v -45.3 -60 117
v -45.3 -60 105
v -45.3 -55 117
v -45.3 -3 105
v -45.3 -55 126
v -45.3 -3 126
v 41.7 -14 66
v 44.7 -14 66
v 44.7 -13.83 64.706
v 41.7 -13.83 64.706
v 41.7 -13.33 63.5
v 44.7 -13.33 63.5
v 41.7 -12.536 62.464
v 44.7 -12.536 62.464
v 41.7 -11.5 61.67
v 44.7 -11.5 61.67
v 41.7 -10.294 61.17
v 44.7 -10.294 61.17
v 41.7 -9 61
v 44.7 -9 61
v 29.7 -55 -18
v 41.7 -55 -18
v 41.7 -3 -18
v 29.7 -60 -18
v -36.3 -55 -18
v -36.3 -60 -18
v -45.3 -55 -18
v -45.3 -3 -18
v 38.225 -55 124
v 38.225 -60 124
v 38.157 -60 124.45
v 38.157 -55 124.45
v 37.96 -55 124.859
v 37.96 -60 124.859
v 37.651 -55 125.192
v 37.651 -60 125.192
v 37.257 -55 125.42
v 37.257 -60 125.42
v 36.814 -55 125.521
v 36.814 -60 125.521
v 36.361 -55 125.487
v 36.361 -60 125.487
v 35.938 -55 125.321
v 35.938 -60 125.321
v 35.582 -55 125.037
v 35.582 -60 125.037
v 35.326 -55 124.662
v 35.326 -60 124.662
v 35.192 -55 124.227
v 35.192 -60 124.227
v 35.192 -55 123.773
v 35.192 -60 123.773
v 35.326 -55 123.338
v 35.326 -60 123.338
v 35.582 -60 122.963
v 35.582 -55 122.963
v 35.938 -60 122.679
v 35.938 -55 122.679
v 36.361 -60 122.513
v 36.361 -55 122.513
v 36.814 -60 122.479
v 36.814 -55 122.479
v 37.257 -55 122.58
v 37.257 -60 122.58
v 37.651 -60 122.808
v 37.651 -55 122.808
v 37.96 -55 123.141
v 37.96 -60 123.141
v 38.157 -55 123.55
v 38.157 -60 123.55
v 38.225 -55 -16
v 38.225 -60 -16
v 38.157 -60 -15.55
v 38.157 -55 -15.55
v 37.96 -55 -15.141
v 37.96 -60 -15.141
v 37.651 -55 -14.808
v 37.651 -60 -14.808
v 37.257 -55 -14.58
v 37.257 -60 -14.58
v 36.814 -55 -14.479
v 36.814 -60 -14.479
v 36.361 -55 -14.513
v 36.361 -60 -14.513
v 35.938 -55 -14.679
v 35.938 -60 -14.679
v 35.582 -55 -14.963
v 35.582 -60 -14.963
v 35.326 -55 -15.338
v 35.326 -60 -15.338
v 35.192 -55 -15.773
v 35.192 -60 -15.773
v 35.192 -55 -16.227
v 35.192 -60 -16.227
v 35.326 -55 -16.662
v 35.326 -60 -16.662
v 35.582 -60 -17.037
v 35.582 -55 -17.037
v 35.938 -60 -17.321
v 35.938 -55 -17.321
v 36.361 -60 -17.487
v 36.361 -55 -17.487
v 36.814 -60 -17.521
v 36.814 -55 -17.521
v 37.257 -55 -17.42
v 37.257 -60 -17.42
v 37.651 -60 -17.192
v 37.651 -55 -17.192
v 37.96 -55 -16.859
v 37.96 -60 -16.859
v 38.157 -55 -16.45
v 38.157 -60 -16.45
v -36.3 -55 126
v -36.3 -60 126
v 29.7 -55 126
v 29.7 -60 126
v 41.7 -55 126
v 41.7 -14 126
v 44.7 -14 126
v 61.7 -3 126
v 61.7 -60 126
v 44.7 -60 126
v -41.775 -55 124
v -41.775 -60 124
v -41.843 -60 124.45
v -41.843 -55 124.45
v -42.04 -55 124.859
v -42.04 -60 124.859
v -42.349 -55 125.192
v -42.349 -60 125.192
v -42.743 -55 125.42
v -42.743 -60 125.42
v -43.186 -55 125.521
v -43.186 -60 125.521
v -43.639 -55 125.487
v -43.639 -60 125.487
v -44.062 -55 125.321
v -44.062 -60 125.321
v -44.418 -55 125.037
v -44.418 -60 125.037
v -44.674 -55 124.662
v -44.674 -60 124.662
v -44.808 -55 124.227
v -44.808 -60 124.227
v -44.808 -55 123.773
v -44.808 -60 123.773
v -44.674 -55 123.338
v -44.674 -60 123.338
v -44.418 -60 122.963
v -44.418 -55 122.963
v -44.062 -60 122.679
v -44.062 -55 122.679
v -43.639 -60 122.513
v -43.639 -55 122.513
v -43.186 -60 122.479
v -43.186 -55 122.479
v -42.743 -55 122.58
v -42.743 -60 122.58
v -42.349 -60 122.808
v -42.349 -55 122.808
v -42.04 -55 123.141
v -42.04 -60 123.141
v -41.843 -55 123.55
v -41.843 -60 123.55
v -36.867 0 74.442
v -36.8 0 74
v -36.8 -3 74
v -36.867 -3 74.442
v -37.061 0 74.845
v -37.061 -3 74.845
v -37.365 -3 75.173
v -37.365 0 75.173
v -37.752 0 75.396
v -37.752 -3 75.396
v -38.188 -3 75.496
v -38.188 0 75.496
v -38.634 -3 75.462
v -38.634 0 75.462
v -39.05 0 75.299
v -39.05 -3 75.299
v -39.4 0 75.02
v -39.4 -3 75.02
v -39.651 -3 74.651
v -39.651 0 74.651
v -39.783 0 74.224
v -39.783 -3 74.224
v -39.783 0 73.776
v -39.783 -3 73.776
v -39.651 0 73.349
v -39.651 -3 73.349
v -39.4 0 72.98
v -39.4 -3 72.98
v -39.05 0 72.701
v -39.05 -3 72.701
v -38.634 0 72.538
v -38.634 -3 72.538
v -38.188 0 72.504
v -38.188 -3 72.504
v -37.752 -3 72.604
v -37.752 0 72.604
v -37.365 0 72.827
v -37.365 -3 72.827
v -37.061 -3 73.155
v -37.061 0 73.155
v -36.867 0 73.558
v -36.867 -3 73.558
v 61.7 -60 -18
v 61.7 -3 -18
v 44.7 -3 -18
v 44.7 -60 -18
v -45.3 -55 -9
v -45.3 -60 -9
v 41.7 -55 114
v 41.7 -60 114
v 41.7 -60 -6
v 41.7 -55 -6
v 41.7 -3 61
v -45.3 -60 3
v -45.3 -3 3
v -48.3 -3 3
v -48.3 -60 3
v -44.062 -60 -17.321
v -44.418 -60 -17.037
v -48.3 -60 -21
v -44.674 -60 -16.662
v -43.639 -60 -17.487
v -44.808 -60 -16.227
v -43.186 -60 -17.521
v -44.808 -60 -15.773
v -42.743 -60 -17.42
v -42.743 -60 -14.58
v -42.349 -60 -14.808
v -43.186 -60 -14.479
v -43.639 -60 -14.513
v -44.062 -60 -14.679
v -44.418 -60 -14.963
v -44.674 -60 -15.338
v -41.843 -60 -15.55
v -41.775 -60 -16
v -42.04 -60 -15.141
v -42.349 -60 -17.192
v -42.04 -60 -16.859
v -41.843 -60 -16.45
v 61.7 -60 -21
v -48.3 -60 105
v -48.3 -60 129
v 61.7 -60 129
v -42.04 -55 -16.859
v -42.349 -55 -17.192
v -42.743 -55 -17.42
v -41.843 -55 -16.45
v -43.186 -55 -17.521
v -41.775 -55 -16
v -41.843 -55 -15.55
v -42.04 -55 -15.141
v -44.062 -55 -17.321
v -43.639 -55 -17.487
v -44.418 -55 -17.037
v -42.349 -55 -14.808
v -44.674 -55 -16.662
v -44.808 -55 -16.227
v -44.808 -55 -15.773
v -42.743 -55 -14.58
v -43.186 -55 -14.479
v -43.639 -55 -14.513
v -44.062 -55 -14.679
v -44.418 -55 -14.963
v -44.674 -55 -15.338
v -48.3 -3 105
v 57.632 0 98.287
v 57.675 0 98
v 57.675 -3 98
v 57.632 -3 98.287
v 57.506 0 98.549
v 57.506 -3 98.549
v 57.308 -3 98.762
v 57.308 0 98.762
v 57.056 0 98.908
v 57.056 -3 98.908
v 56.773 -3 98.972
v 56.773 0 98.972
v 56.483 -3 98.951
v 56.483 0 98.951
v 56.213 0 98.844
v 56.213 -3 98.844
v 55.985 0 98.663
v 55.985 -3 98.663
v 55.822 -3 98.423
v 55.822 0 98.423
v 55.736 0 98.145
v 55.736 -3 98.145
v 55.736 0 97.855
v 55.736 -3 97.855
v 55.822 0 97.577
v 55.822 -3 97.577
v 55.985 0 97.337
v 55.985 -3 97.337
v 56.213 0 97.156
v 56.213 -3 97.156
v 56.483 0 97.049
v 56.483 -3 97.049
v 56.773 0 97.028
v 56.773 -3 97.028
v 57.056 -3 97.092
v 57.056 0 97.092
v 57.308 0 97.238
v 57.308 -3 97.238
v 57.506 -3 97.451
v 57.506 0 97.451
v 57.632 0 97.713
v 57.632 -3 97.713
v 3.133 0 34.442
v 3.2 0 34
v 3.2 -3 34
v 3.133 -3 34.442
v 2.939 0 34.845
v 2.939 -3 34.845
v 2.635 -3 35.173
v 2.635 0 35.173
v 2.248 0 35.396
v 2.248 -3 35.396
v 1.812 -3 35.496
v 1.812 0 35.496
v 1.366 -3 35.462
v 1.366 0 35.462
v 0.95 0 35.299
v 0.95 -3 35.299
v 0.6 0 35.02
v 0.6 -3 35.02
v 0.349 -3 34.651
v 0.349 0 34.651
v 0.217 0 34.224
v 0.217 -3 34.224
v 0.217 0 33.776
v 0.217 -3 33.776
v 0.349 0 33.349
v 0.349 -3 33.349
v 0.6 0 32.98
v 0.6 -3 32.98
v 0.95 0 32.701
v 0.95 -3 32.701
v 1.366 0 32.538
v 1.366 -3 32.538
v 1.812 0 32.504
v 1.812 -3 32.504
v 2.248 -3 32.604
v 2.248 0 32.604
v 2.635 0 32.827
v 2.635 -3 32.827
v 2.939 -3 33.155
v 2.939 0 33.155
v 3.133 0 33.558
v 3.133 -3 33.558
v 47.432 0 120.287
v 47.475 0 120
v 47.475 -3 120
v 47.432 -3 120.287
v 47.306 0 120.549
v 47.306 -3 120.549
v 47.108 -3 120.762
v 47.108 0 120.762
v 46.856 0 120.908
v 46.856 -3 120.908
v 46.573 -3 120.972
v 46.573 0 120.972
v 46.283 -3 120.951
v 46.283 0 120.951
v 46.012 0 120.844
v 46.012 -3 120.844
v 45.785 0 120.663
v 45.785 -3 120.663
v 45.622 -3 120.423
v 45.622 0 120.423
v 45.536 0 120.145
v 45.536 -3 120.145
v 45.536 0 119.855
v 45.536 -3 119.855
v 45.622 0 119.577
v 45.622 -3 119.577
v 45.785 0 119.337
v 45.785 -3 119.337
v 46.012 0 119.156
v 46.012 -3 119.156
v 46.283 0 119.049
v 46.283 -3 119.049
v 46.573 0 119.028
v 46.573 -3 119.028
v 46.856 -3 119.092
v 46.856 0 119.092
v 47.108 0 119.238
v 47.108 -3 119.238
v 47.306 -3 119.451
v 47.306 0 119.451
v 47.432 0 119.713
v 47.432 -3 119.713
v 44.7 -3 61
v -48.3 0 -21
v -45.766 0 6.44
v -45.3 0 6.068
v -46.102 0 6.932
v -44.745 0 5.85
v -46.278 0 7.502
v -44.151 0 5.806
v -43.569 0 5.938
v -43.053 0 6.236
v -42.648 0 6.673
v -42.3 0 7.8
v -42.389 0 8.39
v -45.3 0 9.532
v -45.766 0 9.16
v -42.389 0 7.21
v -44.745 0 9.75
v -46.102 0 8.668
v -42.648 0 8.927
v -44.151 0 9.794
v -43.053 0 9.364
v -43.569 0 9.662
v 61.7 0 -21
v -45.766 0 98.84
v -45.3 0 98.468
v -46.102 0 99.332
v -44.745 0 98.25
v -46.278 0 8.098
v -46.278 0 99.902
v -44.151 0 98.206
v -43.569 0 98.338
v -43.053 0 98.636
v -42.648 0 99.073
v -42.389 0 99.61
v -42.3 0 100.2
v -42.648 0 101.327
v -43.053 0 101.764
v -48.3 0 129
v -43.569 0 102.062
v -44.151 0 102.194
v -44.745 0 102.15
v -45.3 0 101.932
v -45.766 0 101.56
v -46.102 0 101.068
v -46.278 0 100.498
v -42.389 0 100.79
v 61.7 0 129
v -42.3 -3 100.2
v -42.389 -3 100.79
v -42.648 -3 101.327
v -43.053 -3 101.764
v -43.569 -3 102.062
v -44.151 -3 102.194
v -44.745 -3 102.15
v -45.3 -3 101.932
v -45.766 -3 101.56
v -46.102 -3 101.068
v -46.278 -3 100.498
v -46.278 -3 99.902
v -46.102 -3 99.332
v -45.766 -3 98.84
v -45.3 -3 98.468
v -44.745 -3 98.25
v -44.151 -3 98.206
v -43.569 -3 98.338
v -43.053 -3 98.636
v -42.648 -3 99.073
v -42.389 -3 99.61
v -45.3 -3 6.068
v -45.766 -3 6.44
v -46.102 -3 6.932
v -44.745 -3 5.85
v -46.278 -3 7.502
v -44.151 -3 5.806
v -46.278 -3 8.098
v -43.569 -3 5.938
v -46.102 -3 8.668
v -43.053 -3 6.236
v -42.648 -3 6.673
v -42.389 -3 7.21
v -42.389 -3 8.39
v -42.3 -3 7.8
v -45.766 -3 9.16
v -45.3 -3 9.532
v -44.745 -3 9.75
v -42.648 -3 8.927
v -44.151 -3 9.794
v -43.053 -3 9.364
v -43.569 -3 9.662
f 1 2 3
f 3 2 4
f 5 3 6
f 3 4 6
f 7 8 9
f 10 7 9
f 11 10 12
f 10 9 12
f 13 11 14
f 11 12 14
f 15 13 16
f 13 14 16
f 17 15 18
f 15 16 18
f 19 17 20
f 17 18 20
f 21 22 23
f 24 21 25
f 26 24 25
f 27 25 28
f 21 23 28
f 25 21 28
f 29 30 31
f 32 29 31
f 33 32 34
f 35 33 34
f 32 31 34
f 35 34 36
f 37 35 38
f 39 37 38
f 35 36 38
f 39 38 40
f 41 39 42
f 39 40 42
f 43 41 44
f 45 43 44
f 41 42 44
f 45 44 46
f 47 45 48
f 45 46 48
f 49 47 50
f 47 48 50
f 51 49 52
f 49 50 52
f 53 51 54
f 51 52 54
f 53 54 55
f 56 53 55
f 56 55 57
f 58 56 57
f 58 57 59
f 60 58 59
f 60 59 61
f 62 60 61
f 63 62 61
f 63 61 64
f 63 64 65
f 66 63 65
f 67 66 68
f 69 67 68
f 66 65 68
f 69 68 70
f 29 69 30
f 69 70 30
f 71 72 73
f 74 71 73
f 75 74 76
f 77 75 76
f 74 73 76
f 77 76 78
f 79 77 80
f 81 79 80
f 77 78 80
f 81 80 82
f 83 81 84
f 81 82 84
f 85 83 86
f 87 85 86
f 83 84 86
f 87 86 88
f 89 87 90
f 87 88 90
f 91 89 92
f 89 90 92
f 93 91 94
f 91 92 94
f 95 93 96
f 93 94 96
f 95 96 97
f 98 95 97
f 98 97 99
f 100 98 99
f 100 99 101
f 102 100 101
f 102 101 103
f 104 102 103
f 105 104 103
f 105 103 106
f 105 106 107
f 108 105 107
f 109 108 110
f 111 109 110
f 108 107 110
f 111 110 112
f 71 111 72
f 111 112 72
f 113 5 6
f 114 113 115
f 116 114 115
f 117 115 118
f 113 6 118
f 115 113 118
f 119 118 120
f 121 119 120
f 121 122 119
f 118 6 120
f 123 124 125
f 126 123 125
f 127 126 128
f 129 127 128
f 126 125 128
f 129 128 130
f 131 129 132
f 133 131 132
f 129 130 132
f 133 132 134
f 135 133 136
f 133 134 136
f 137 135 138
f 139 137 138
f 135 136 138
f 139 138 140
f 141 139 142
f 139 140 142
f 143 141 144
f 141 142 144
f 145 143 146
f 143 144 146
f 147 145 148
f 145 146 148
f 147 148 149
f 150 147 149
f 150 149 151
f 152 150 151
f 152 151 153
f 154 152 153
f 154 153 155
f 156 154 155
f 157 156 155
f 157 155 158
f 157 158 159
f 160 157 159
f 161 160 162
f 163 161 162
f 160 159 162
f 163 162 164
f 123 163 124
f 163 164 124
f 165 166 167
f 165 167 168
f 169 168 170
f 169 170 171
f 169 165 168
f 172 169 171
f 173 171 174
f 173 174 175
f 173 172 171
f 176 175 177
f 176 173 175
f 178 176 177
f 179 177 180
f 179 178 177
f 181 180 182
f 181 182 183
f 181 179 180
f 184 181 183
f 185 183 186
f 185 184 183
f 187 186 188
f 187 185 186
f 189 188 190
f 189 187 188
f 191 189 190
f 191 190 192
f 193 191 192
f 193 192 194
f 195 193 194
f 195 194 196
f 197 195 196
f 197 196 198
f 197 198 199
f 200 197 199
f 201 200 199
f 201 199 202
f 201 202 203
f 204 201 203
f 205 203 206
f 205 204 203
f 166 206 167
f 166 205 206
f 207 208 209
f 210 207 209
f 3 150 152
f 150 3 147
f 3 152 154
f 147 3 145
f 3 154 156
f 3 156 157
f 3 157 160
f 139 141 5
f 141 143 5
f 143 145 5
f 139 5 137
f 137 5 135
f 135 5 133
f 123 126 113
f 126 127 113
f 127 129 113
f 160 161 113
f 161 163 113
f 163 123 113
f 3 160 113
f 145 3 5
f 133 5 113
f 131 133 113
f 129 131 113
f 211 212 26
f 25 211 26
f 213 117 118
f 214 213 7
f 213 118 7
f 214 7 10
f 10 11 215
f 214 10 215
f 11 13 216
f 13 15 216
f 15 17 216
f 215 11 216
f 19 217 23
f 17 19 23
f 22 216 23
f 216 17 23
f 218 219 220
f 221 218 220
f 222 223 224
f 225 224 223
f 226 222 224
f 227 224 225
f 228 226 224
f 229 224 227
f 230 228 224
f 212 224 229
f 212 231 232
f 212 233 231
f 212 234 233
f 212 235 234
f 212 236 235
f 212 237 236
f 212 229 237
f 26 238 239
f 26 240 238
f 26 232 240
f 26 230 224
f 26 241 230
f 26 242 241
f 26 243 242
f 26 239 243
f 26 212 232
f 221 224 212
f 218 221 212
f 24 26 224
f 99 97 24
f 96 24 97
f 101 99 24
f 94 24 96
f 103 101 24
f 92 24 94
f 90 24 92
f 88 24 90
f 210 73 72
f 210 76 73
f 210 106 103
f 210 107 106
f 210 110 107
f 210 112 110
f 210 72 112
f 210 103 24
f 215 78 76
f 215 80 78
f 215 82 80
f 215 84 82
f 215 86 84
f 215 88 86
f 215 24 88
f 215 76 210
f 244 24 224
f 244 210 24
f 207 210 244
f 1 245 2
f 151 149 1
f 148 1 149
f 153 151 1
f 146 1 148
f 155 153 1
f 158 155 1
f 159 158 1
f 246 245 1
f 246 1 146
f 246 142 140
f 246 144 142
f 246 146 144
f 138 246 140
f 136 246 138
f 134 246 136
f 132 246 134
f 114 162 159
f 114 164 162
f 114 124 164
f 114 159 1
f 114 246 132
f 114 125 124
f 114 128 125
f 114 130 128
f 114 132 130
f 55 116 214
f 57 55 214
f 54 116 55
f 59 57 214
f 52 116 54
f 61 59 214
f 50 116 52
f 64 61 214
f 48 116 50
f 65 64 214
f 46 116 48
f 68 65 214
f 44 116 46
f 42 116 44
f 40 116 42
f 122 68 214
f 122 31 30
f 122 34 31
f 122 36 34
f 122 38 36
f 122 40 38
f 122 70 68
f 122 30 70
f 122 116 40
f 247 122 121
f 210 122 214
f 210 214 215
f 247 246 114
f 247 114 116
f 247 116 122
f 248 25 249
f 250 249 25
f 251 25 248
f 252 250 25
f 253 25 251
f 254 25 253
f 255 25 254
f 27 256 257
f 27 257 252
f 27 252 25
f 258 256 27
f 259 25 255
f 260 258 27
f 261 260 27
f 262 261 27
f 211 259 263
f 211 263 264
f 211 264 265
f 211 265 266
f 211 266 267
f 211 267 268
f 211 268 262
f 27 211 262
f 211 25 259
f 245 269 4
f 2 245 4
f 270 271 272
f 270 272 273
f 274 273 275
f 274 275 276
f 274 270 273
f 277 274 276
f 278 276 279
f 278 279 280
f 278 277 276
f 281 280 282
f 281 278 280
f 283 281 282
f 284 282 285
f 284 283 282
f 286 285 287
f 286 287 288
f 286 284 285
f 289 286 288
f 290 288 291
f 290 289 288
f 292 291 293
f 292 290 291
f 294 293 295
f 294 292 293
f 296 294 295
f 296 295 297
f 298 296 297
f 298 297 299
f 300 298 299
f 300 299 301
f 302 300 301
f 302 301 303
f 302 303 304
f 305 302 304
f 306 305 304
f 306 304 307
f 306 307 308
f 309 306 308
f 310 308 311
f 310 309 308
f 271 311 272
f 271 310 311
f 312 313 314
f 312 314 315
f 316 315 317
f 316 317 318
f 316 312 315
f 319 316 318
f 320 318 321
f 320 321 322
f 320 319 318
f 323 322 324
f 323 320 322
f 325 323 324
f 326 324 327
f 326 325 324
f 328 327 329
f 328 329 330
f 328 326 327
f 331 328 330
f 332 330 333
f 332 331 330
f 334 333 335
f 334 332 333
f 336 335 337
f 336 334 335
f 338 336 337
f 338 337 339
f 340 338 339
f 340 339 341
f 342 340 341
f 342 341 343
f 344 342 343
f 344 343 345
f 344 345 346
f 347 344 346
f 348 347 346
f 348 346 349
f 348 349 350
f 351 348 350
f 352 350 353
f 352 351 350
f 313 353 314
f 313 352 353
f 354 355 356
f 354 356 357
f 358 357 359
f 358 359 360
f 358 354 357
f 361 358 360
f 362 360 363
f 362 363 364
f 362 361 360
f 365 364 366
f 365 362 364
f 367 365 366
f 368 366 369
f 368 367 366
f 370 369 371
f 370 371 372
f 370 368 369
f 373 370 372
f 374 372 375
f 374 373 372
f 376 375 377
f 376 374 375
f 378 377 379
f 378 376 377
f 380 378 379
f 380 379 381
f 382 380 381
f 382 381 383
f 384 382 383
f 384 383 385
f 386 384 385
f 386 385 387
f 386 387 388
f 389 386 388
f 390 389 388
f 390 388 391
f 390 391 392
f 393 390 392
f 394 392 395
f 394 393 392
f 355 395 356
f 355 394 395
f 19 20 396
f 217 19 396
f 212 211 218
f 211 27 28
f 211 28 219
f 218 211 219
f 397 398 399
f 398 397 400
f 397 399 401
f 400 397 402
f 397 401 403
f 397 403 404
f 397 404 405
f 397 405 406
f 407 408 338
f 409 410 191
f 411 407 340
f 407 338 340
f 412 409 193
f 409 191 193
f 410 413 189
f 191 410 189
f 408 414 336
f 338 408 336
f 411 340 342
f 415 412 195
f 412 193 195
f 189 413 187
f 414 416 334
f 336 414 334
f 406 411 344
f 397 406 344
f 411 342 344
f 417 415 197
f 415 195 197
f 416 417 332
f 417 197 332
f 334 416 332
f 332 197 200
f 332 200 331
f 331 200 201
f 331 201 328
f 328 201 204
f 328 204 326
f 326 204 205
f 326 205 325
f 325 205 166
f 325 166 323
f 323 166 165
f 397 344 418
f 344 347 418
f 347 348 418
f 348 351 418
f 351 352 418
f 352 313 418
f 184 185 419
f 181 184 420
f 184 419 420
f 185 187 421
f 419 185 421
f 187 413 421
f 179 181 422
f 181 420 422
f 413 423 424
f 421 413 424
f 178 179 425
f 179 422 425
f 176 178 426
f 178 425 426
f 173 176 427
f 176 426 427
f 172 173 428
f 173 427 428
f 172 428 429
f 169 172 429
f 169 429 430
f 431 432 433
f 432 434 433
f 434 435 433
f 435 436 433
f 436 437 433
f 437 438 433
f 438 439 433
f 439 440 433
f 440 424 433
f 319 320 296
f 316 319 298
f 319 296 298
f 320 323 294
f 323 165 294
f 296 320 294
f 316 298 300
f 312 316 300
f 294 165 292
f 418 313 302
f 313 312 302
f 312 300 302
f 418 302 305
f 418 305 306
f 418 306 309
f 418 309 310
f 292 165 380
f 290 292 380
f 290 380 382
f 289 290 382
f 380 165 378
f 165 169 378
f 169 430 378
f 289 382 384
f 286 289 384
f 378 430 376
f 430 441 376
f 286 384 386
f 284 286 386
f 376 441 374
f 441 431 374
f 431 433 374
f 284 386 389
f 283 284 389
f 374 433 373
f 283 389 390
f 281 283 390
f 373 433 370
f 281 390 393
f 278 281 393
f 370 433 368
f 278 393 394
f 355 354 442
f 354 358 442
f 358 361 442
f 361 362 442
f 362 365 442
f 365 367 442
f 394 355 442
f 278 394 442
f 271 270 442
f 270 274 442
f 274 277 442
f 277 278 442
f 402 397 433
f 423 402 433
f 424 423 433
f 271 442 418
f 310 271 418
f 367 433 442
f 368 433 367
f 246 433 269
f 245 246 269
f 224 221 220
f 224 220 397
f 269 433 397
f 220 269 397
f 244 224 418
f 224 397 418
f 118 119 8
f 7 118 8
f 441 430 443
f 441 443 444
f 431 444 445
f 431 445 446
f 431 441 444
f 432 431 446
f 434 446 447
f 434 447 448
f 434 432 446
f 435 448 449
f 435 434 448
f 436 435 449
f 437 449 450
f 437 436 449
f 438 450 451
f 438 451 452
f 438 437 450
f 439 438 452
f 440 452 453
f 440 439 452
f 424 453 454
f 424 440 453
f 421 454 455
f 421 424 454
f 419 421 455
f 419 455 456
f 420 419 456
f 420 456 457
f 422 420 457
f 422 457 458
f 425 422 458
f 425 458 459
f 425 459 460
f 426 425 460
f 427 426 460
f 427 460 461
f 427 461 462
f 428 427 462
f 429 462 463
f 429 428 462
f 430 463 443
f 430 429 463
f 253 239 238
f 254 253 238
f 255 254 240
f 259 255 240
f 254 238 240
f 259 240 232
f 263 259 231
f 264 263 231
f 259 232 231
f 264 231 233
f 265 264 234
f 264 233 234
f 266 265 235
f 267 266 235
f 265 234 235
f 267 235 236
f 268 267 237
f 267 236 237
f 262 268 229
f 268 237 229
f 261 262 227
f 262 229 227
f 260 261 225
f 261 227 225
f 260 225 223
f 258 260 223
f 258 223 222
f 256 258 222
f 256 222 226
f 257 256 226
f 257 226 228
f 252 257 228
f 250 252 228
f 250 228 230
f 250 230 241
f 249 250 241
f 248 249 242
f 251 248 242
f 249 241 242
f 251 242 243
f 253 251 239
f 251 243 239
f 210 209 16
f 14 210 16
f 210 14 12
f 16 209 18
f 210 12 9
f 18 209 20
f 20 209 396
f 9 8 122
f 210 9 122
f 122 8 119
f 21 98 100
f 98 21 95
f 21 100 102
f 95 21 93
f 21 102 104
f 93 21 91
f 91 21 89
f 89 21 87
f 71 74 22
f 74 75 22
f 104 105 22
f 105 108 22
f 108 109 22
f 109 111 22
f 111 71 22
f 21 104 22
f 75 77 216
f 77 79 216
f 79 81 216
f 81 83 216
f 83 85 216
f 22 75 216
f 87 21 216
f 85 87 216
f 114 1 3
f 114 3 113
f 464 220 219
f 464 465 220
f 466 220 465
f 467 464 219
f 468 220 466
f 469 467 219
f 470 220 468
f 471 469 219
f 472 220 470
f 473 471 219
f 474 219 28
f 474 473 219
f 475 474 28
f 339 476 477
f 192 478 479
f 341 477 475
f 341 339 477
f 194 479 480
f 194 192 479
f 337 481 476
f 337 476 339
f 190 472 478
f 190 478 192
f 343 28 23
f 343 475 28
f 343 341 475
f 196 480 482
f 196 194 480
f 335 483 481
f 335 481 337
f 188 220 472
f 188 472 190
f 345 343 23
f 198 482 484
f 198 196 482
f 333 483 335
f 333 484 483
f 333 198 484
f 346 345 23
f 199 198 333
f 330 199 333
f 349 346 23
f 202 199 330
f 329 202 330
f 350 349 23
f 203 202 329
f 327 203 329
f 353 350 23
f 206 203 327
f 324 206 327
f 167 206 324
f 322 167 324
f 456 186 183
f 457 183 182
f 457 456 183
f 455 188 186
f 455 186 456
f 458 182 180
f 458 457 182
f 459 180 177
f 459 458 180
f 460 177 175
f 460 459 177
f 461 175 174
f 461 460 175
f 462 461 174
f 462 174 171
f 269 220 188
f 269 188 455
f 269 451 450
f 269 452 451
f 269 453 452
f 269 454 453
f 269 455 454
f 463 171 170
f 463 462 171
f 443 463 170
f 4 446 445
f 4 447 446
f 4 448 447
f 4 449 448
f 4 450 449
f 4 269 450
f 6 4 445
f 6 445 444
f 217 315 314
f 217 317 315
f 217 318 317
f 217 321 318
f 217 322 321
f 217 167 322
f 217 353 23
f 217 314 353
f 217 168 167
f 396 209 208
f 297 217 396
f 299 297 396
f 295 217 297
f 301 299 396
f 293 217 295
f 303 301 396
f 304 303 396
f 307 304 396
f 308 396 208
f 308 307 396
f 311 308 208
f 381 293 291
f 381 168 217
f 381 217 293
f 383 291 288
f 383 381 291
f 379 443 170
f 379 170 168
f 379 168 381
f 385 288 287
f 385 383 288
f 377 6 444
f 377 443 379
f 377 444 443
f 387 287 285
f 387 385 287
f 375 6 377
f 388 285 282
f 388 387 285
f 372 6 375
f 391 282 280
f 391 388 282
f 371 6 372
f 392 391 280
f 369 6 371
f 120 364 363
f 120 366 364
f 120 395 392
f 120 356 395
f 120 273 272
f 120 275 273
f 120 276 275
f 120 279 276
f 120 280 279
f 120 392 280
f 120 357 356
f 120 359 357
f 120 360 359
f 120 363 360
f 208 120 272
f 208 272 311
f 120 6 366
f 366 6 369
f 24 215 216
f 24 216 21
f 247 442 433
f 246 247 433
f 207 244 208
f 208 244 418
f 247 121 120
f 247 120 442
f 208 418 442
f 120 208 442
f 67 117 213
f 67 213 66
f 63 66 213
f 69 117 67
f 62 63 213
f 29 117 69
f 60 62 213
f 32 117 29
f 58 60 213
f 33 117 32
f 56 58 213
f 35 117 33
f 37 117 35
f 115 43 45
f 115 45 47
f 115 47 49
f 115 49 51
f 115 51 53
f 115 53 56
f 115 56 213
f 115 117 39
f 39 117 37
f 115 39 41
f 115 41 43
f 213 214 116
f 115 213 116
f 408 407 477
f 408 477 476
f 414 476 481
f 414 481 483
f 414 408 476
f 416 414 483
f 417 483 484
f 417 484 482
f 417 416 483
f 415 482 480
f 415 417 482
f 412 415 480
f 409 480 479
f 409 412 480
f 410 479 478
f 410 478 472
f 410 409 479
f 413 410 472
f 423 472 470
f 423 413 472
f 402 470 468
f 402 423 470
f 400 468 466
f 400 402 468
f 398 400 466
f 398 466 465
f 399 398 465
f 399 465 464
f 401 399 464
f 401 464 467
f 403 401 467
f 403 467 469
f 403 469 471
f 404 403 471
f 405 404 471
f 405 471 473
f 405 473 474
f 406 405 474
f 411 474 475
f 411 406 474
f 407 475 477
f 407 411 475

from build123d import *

# Parameters (mm, degrees)
SKETCH029_W     = 110
SKETCH029_H     = 150
SKETCH029_R     = 2
SKETCH029_R_2   = 0.975
SKETCH029_R_3   = 1.5
PAD018_DEPTH    = 3
PAD019_DEPTH    = 57
SKETCH031_R     = 1.525
PAD020_DEPTH    = 5
POCKET007_DEPTH = 3


with BuildPart() as part:
    # Sketch029 → Pad018 (new body)
    with BuildSketch(Plane.XZ):
        with Locations((6.7, 54)):
            Rectangle(SKETCH029_W, SKETCH029_H)
        with Locations((-44.3, 100.2)):
            Circle(SKETCH029_R, mode=Mode.SUBTRACT)
        with Locations((-44.3, 7.8)):
            Circle(SKETCH029_R, mode=Mode.SUBTRACT)
        with Locations((56.7, 98)):
            Circle(SKETCH029_R_2, mode=Mode.SUBTRACT)
        with Locations((46.5, 120)):
            Circle(SKETCH029_R_2, mode=Mode.SUBTRACT)
        with Locations((-38.3, 74)):
            Circle(SKETCH029_R_3, mode=Mode.SUBTRACT)
        with Locations((1.7, 34)):
            Circle(SKETCH029_R_3, mode=Mode.SUBTRACT)
    extrude(amount=PAD018_DEPTH)

    # Sketch030 (on Face12 of Pad018) → Pad019 (join)
    with BuildSketch(Plane.XZ.offset(3)):
        Polygon((61.7, 129), (-48.3, 129), (-48.3, 105), (-45.3, 105), (-45.3, 126), (41.7, 126), (41.7, -18), (-45.3, -18), (-45.3, 3), (-48.3, 3), (-48.3, -21), (61.7, -21), (61.7, -18), (44.7, -18), (44.7, 126), (61.7, 126), align=None)
    extrude(amount=PAD019_DEPTH)

    # Sketch031 (on Face19 of Pad019) → Pad020 (join)
    with BuildSketch(Plane.XZ.offset(60)):
        Polygon((-48.3, -21), (-48.3, -6), (-33.3, -21), align=None)
        with Locations((-43.3, -16)):
            Circle(SKETCH031_R, mode=Mode.SUBTRACT)
        Polygon((-48.3, 129), (-48.3, 114), (-33.3, 129), align=None)
        with Locations((-43.3, 124)):
            Circle(SKETCH031_R, mode=Mode.SUBTRACT)
        Polygon((41.7, -21), (41.7, -6), (26.7, -21), align=None)
        with Locations((36.7, -16)):
            Circle(SKETCH031_R, mode=Mode.SUBTRACT)
        Polygon((41.7, 129), (41.7, 114), (26.7, 129), align=None)
        with Locations((36.7, 124)):
            Circle(SKETCH031_R, mode=Mode.SUBTRACT)
    extrude(amount=-PAD020_DEPTH)

    # Sketch032 (on Face37 of Pad020) → Pocket007 (cut)
    with BuildSketch(Plane(origin=(44.7, 0, 0), x_dir=(0, 0, 1), z_dir=(1, 0, 0))):
        with BuildLine():
            Line((126, 3), (126, 14))
            Line((126, 14), (66, 14))
            ThreePointArc((66, 14), (62.464466, 12.535534), (61, 9))
            Line((61, 9), (61, 3))
            Line((61, 3), (126, 3))
        make_face()
    extrude(amount=-POCKET007_DEPTH, mode=Mode.SUBTRACT)


solid = part.part
